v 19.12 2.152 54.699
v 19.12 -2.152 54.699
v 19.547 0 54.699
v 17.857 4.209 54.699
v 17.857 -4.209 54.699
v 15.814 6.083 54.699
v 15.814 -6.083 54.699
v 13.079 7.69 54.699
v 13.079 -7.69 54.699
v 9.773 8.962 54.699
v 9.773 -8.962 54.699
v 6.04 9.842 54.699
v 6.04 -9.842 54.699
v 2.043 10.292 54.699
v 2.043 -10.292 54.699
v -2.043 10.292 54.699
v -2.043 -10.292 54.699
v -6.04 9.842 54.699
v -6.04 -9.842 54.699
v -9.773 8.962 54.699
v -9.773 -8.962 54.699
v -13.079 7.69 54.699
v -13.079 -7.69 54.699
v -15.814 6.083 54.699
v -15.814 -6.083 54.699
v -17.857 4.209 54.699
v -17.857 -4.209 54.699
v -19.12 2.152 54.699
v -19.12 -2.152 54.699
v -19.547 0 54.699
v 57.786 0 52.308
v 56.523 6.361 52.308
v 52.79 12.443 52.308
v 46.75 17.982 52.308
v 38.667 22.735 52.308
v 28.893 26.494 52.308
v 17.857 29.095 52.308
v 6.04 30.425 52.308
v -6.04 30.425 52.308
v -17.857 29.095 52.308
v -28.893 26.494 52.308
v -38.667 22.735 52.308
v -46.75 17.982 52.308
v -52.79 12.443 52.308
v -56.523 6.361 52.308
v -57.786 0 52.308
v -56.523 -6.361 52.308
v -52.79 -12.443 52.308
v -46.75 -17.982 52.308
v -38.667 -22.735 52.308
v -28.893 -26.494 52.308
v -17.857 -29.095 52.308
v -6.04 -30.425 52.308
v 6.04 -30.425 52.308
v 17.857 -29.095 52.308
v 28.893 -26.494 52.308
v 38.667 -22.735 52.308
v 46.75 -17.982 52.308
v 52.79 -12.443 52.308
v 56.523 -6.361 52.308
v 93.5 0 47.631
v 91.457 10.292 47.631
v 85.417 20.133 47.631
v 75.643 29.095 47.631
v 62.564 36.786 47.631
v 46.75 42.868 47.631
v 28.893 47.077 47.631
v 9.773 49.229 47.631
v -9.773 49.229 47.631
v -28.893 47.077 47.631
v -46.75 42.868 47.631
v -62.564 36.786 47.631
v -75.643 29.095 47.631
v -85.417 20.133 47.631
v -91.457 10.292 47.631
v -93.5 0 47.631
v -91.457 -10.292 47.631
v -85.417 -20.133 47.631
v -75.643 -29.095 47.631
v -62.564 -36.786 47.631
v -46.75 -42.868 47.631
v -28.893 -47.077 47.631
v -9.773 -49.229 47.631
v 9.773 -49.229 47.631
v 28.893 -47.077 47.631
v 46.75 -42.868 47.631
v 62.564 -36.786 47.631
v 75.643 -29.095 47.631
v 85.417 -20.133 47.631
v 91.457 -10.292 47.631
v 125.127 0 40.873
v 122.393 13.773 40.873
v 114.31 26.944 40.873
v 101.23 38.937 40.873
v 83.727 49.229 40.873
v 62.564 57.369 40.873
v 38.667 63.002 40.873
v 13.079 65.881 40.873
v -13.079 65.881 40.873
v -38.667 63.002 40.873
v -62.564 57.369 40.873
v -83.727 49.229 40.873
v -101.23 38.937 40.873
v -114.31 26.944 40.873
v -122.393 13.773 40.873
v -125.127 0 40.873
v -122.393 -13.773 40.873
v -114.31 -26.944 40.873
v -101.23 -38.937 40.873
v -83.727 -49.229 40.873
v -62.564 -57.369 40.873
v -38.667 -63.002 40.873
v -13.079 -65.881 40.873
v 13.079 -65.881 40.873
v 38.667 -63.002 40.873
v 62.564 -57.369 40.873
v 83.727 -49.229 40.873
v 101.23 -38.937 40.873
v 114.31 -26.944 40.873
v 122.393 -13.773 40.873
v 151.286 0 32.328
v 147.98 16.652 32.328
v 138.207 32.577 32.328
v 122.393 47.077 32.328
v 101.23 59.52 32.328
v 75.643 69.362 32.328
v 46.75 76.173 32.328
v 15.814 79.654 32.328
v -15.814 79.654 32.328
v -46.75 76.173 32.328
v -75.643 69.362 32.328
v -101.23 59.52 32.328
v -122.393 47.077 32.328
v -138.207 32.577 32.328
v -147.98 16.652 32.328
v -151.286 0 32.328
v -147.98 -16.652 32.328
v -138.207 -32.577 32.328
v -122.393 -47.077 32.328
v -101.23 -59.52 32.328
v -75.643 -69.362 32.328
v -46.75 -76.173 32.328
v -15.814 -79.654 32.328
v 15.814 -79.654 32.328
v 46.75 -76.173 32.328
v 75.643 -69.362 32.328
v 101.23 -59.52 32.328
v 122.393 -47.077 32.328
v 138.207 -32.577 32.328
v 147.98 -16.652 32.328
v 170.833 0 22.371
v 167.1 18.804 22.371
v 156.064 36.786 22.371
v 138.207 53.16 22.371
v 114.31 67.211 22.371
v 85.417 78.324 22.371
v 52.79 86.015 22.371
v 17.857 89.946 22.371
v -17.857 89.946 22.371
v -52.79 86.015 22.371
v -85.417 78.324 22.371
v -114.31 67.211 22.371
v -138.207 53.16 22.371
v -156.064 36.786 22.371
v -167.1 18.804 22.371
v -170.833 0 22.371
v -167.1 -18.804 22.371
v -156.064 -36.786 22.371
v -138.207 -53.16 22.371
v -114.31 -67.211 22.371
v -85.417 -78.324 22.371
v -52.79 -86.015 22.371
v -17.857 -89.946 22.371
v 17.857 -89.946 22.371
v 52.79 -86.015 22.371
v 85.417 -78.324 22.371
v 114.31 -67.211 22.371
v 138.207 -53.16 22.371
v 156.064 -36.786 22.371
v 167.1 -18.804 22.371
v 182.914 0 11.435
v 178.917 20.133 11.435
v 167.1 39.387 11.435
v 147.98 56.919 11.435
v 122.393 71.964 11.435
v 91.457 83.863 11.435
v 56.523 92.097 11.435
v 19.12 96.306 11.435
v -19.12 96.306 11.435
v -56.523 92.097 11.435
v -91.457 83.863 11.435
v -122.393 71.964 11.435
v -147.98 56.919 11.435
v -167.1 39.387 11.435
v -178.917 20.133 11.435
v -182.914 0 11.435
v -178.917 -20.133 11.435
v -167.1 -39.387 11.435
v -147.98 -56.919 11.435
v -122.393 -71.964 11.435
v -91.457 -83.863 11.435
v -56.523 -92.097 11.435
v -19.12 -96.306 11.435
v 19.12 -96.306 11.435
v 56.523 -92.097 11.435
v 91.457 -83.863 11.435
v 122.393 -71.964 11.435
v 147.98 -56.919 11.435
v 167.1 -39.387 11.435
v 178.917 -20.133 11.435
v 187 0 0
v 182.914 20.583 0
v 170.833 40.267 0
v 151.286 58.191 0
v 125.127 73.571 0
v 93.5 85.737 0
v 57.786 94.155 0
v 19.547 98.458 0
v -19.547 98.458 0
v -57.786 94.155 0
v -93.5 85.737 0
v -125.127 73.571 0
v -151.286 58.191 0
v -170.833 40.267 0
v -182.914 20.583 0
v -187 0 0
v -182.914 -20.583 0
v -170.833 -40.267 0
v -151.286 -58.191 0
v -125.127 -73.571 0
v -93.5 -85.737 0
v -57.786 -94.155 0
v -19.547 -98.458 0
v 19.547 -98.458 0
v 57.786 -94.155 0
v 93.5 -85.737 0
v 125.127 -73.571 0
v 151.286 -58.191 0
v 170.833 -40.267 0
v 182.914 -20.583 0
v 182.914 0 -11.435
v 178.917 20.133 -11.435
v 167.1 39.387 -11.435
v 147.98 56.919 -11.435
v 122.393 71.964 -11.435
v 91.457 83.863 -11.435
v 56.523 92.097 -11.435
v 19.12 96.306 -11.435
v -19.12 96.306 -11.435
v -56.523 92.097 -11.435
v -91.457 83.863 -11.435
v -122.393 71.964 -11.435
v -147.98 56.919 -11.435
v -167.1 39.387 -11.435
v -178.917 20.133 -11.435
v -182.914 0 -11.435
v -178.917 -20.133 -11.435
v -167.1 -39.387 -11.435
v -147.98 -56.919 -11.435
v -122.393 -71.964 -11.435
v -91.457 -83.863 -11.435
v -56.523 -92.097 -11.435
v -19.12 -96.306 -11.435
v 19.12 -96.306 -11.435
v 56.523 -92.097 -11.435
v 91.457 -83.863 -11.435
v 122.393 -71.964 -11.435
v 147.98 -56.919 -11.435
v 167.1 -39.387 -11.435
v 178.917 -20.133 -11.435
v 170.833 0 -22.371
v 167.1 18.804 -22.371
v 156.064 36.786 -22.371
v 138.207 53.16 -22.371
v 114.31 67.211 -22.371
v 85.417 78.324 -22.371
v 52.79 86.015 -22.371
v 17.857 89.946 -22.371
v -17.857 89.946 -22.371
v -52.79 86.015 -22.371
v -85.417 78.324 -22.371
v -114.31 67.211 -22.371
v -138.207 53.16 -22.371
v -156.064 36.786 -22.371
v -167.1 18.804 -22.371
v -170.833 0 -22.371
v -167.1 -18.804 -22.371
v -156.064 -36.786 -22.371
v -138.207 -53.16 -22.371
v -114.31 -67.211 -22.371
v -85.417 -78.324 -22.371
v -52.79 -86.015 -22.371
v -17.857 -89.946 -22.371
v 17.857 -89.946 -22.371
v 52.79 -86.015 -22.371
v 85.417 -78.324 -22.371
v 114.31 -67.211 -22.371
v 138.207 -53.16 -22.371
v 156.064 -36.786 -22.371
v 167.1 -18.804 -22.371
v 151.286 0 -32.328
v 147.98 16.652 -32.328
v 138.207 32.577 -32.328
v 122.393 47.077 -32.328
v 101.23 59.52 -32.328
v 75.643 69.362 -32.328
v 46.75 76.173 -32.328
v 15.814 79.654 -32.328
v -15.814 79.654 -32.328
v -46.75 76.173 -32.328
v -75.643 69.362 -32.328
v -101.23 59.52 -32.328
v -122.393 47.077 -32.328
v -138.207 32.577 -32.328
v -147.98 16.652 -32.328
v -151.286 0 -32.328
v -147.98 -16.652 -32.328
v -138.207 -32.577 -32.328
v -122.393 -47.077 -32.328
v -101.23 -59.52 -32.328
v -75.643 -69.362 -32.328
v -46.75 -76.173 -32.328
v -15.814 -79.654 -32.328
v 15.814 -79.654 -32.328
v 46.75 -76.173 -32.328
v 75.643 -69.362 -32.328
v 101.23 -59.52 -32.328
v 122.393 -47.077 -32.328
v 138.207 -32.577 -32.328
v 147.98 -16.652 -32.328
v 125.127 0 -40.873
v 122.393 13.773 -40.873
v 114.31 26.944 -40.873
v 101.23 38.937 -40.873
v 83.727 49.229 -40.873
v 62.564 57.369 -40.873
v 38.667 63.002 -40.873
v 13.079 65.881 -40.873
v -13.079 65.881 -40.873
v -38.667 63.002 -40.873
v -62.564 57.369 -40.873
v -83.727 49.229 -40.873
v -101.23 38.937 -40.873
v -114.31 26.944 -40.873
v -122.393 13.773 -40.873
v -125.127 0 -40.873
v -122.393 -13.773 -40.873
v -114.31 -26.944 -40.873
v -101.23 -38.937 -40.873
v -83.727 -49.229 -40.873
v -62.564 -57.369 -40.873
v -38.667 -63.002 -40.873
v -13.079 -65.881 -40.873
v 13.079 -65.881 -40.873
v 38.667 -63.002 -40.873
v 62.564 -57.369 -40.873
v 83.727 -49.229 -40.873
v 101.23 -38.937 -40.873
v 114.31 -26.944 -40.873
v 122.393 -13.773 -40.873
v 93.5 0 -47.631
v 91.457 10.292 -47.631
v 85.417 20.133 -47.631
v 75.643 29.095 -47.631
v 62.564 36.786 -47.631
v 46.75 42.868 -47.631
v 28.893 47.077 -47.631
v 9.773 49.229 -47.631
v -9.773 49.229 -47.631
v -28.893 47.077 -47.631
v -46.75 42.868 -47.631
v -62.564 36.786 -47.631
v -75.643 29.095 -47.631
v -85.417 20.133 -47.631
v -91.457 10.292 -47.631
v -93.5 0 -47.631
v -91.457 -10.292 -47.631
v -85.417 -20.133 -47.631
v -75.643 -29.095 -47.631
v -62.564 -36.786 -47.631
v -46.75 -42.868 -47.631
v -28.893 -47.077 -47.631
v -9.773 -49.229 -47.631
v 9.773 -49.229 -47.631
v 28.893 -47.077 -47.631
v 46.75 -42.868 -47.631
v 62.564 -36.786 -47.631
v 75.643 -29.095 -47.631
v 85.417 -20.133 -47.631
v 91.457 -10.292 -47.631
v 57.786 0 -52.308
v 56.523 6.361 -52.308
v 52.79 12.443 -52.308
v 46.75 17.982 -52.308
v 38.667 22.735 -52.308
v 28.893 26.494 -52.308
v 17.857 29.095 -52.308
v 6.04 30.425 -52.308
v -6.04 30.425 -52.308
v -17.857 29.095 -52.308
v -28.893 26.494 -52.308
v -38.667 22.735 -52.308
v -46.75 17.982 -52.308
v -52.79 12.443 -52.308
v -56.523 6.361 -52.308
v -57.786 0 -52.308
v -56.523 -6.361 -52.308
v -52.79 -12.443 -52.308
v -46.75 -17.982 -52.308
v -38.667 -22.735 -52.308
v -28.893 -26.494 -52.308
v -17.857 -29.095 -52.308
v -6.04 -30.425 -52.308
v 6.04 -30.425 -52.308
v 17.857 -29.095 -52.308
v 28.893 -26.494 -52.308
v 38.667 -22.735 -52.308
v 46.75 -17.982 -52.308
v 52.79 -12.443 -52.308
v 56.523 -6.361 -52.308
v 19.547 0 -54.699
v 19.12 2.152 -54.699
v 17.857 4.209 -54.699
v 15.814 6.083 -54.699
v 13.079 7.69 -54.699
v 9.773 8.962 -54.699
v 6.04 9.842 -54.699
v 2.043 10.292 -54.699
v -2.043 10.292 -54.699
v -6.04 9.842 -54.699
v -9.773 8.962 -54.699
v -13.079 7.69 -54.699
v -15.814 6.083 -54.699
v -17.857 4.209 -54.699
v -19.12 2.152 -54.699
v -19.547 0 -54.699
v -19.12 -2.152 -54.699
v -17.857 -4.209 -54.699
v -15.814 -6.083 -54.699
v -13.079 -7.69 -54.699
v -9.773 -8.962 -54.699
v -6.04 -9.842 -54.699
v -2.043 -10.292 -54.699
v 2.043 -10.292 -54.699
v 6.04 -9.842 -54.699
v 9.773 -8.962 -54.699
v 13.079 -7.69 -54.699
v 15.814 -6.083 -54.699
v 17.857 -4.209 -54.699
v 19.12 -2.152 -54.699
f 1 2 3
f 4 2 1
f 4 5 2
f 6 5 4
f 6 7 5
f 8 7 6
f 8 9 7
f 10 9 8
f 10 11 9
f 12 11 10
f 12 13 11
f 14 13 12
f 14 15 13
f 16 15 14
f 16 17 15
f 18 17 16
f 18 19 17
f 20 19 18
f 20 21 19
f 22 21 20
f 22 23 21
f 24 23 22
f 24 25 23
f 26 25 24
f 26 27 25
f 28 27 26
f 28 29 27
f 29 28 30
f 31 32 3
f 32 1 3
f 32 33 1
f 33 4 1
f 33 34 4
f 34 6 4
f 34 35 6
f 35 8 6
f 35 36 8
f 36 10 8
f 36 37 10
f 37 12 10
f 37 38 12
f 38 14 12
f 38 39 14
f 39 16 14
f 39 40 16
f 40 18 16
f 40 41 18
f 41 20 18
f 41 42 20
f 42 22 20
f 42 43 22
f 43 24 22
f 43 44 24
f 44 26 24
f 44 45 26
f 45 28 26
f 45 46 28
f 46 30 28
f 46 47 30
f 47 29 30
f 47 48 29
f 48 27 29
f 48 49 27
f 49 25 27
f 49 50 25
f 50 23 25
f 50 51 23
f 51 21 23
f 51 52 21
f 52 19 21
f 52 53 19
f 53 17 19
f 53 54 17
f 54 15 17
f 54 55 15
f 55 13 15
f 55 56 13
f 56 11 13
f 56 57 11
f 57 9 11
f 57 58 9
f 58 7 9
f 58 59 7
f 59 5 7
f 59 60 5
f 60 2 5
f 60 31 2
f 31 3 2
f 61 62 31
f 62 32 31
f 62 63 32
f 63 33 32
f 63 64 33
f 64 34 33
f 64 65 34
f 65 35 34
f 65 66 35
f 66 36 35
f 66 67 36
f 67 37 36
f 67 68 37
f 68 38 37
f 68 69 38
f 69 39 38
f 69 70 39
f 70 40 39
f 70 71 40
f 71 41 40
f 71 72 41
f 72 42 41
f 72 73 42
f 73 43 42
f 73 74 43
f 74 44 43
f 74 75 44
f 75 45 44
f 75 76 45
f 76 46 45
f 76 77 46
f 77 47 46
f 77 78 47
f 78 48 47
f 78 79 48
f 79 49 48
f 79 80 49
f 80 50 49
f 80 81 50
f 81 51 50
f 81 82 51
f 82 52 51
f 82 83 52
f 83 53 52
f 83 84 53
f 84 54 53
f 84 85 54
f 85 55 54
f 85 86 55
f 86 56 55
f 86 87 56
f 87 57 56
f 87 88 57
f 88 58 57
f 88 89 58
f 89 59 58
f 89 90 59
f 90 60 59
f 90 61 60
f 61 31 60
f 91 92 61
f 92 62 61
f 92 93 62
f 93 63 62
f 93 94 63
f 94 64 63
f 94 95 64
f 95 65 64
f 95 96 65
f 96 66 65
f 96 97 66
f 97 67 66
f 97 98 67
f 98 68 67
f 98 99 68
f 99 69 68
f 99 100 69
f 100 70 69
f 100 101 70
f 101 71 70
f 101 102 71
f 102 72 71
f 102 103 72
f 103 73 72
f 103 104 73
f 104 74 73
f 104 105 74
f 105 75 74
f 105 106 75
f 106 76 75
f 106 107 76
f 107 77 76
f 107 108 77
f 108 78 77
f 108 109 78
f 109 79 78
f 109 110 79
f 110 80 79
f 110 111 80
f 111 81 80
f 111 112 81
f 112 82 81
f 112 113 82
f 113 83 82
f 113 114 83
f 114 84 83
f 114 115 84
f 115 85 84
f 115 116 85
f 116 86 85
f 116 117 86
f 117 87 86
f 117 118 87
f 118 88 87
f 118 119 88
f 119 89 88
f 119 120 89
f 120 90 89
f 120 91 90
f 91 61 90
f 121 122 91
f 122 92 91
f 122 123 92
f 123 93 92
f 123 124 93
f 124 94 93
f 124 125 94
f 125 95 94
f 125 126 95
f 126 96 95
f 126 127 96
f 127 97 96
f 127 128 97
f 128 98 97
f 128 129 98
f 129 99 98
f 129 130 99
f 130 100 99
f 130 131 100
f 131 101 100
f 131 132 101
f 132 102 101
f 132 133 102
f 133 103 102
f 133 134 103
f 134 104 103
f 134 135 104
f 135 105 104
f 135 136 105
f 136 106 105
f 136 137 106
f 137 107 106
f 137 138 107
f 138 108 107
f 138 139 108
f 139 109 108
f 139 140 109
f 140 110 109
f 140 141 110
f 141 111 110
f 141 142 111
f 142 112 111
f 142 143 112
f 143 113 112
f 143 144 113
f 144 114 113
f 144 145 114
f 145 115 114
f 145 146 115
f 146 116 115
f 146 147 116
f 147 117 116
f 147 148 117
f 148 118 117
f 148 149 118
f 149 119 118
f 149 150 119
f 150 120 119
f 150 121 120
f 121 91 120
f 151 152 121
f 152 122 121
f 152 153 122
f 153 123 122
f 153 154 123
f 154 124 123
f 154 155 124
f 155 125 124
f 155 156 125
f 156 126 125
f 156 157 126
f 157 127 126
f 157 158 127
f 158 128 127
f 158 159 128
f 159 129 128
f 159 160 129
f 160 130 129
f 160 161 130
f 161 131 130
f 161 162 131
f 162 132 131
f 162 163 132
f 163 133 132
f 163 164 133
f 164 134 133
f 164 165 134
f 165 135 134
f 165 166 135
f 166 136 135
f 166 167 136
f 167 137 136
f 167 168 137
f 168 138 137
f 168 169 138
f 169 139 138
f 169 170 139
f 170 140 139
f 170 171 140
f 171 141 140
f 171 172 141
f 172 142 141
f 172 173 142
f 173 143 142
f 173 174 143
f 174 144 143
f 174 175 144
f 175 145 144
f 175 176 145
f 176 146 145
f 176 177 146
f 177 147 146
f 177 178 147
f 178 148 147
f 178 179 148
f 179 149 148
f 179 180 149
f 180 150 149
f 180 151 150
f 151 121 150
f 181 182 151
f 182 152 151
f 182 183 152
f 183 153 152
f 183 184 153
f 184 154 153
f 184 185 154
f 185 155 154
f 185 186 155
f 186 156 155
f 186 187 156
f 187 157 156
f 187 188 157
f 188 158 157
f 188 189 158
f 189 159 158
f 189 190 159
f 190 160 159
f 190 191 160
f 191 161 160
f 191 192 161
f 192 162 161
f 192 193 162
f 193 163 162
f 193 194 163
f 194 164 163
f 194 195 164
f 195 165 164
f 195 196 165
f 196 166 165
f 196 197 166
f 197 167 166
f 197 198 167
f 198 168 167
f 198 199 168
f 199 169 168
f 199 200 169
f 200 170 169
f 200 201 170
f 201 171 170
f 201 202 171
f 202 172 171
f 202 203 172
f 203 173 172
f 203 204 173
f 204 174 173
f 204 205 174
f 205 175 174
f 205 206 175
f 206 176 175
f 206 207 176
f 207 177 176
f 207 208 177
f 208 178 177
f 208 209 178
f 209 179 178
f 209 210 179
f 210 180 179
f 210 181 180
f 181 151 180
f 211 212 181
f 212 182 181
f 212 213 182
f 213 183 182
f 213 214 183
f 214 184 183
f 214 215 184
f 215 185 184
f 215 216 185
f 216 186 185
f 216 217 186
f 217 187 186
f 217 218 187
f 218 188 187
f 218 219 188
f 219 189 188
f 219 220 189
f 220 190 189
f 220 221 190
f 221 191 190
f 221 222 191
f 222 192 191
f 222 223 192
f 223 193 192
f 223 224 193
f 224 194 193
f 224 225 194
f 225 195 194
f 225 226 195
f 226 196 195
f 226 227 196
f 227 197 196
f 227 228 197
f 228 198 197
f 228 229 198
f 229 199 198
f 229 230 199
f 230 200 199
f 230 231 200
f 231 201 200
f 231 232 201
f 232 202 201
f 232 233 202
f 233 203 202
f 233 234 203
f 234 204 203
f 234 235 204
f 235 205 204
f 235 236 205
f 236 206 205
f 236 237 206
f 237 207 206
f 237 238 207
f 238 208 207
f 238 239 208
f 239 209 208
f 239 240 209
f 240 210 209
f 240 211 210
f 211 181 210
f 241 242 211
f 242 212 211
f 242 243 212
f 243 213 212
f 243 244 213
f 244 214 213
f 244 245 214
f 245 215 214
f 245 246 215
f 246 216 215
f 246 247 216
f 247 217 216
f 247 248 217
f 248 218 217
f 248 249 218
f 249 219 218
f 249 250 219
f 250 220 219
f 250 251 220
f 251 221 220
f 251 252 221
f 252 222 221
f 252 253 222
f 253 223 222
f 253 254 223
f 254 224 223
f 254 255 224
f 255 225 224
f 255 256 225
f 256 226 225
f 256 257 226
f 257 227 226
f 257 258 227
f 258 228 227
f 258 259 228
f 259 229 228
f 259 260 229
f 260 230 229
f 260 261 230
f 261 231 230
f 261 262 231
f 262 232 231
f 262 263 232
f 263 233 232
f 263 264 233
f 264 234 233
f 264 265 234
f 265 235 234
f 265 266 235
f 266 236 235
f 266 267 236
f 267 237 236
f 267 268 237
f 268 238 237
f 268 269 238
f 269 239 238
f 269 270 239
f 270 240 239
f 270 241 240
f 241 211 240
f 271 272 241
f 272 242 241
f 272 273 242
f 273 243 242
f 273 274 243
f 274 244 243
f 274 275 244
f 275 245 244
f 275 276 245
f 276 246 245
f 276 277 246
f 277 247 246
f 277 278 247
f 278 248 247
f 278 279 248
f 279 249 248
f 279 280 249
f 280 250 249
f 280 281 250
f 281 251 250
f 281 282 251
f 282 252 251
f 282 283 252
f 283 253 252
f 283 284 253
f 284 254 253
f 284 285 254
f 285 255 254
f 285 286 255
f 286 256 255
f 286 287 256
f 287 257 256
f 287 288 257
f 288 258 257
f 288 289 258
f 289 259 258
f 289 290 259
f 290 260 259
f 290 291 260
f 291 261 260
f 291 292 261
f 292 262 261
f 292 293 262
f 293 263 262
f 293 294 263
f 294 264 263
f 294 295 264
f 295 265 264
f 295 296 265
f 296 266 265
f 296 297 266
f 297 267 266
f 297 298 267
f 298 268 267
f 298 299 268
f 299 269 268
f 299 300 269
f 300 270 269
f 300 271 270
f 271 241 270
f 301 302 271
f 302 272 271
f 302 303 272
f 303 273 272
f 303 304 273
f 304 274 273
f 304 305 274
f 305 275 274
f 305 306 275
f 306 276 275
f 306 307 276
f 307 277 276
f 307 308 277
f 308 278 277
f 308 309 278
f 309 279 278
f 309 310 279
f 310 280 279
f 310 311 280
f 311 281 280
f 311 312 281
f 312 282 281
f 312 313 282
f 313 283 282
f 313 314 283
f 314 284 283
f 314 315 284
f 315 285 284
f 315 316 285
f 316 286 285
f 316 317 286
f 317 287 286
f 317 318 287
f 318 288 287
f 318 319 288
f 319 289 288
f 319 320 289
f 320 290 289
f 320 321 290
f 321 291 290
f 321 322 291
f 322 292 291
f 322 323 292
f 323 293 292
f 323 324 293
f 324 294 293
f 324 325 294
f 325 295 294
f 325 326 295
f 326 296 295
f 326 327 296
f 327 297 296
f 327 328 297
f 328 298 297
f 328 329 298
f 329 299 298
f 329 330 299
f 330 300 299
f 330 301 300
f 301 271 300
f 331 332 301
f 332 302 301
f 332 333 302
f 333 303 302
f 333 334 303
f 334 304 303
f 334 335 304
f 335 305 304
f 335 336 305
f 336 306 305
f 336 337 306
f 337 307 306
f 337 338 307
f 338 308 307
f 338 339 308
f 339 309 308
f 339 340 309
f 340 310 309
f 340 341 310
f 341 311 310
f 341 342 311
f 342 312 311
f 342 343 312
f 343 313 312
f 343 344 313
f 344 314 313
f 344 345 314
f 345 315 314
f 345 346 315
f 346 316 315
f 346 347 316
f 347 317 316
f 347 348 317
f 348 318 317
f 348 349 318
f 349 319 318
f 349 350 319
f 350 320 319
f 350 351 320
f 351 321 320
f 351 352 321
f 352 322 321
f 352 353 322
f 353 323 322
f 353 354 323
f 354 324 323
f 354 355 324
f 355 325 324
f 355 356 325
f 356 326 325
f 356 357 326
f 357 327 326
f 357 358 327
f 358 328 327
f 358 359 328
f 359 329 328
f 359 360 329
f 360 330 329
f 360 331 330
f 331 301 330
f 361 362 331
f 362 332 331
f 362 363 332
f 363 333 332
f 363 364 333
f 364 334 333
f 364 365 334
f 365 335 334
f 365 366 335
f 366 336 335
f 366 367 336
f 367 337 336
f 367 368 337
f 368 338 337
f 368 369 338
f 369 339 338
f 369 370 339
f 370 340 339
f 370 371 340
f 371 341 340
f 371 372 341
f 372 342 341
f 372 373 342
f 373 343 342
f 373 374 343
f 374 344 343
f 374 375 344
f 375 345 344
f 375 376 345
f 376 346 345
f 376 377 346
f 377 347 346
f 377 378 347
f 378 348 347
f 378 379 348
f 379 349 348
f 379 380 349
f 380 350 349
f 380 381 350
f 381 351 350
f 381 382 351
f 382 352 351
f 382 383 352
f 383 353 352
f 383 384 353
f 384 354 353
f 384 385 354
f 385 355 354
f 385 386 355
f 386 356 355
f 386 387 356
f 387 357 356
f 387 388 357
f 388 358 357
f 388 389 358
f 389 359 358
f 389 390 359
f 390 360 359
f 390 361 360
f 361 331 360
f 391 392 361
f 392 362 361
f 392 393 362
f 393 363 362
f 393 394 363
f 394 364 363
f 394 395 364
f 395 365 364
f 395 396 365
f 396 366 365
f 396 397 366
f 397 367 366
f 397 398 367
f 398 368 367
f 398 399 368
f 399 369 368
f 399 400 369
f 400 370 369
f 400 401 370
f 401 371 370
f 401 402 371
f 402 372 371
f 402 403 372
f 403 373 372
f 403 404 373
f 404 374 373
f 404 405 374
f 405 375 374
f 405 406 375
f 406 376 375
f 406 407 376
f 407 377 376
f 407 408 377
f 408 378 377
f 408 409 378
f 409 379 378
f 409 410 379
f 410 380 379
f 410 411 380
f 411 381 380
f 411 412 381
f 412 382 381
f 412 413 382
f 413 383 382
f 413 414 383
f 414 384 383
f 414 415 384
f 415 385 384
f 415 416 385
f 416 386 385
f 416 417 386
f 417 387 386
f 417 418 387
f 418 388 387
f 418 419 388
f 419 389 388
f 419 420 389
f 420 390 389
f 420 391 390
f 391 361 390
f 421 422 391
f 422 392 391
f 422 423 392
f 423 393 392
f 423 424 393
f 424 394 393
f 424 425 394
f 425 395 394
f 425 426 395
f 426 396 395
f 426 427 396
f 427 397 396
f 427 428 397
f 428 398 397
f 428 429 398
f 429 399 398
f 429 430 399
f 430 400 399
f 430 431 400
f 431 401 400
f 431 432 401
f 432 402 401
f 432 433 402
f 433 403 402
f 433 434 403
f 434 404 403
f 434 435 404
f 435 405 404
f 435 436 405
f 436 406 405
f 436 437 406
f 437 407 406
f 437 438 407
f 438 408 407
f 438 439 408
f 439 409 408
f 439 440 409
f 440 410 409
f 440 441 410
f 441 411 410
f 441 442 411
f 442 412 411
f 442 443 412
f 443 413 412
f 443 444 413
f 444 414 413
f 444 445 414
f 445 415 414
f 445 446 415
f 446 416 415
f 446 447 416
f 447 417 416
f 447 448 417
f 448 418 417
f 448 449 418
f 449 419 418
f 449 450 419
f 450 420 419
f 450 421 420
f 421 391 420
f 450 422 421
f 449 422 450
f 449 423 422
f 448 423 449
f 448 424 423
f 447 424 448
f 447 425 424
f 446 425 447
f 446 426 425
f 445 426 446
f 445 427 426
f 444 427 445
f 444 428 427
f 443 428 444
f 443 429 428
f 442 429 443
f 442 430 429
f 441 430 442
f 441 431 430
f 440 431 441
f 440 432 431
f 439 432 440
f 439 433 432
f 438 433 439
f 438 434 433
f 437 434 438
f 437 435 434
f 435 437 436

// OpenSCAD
// Generated by SolidPython 1.0.1 on 2020-07-29 00:46:53


scale(v = [17, 9, 5]) {
	sphere(r = 11);
}
/***********************************************
*********      SolidPython code:      **********
************************************************
 
# import packages: SolidPython
from solid import *
from solid.utils import *
from itertools import chain, combinations, permutations


class Resize:

    def __init__(self, scad_file):
        self.scad_file = scad_file
        #self.scad_file = import_scad(scad_file)
        # cone/cylinder param:
        self.r1 = 0
        self.r2 = 0
        self.h = 0
        # rectangular prism param:
        self.w = 0
        self.l = 0
        # ellipse param:
        self.r = 0

    # import OpenScad code (file name corresponds to shape)


    # classify shape + parameters
    def assign(self, param1, param2, param3):
        if self.scad_file == 'cone.scad':
            self.r1 = param1
            self.r2 = param2
            self.h = param3
        elif self.scad_file == 'cylinder.scad':
            self.r1 = param1
            self.r2 = param2
            self.h = param3
        elif self.scad_file == 'rectangularPrism.scad':
            self.h = param1
            self.l = param2
            self.w = param3
        else:
            self.r = param1
            self.h = param2

    # resize parameters
    def iterate(self):
        x = range(3, 20, 2)
        i = 1
        if self.scad_file == 'cone.scad':
            tempList = list(permutations(x, 2))
            for temp in tempList:
                param1 = temp[0]
                param2 = temp[1]
                filepath = 'produced_scad_files/' + 'cone' + str(param1) + '_' + str(param2) + '_' + '.scad'
                scad_render_to_file(cylinder(h=param1, r1=param2, r2=0), filepath)

        elif self.scad_file == 'cylinder.scad':
            tempList = list(permutations(x, 3))
            for temp in tempList:
                param1 = temp[0]
                param2 = temp[1]
                filepath = 'produced_scad_files/' + 'cylinder' + str(param1) + '_' + str(param2) + '_' + '.scad'
                scad_render_to_file(cylinder(h=param1, r1=param2, r2=param2), filepath)

        elif self.scad_file == 'rectangularPrism.scad':
            tempList = list(permutations(x, 3))
            for temp in tempList:
                param1 = temp[0]
                param2 = temp[1]
                param3 = temp[2]
                filepath = 'produced_scad_files/' + 'rectangularPrism' + str(param1) + '_' + str(param2) + '_' + str(
                    param3) + '.scad'
                scad_render_to_file(cube(size=(param1, param2, param3)), filepath)

        elif self.scad_file == 'ellipse.scad':
            tempList = list(permutations(x, 4))
            for temp in tempList:
                param1 = temp[0]
                param2 = temp[1]
                param3 = temp[2]
                param4 = temp[3]
                filepath = 'produced_scad_files/' + 'ellipse' + str(param1) + '_' + str(param2) + '_' + str(param3) + '_' + str(param4) + '.scad'
                scad_render_to_file(scale([param1, param2, param3])(sphere(r=param4)), filepath)

    def render_to_scadfile(self):
        scad_render_to_file(scad, 'example.scad') 
 
************************************************/
